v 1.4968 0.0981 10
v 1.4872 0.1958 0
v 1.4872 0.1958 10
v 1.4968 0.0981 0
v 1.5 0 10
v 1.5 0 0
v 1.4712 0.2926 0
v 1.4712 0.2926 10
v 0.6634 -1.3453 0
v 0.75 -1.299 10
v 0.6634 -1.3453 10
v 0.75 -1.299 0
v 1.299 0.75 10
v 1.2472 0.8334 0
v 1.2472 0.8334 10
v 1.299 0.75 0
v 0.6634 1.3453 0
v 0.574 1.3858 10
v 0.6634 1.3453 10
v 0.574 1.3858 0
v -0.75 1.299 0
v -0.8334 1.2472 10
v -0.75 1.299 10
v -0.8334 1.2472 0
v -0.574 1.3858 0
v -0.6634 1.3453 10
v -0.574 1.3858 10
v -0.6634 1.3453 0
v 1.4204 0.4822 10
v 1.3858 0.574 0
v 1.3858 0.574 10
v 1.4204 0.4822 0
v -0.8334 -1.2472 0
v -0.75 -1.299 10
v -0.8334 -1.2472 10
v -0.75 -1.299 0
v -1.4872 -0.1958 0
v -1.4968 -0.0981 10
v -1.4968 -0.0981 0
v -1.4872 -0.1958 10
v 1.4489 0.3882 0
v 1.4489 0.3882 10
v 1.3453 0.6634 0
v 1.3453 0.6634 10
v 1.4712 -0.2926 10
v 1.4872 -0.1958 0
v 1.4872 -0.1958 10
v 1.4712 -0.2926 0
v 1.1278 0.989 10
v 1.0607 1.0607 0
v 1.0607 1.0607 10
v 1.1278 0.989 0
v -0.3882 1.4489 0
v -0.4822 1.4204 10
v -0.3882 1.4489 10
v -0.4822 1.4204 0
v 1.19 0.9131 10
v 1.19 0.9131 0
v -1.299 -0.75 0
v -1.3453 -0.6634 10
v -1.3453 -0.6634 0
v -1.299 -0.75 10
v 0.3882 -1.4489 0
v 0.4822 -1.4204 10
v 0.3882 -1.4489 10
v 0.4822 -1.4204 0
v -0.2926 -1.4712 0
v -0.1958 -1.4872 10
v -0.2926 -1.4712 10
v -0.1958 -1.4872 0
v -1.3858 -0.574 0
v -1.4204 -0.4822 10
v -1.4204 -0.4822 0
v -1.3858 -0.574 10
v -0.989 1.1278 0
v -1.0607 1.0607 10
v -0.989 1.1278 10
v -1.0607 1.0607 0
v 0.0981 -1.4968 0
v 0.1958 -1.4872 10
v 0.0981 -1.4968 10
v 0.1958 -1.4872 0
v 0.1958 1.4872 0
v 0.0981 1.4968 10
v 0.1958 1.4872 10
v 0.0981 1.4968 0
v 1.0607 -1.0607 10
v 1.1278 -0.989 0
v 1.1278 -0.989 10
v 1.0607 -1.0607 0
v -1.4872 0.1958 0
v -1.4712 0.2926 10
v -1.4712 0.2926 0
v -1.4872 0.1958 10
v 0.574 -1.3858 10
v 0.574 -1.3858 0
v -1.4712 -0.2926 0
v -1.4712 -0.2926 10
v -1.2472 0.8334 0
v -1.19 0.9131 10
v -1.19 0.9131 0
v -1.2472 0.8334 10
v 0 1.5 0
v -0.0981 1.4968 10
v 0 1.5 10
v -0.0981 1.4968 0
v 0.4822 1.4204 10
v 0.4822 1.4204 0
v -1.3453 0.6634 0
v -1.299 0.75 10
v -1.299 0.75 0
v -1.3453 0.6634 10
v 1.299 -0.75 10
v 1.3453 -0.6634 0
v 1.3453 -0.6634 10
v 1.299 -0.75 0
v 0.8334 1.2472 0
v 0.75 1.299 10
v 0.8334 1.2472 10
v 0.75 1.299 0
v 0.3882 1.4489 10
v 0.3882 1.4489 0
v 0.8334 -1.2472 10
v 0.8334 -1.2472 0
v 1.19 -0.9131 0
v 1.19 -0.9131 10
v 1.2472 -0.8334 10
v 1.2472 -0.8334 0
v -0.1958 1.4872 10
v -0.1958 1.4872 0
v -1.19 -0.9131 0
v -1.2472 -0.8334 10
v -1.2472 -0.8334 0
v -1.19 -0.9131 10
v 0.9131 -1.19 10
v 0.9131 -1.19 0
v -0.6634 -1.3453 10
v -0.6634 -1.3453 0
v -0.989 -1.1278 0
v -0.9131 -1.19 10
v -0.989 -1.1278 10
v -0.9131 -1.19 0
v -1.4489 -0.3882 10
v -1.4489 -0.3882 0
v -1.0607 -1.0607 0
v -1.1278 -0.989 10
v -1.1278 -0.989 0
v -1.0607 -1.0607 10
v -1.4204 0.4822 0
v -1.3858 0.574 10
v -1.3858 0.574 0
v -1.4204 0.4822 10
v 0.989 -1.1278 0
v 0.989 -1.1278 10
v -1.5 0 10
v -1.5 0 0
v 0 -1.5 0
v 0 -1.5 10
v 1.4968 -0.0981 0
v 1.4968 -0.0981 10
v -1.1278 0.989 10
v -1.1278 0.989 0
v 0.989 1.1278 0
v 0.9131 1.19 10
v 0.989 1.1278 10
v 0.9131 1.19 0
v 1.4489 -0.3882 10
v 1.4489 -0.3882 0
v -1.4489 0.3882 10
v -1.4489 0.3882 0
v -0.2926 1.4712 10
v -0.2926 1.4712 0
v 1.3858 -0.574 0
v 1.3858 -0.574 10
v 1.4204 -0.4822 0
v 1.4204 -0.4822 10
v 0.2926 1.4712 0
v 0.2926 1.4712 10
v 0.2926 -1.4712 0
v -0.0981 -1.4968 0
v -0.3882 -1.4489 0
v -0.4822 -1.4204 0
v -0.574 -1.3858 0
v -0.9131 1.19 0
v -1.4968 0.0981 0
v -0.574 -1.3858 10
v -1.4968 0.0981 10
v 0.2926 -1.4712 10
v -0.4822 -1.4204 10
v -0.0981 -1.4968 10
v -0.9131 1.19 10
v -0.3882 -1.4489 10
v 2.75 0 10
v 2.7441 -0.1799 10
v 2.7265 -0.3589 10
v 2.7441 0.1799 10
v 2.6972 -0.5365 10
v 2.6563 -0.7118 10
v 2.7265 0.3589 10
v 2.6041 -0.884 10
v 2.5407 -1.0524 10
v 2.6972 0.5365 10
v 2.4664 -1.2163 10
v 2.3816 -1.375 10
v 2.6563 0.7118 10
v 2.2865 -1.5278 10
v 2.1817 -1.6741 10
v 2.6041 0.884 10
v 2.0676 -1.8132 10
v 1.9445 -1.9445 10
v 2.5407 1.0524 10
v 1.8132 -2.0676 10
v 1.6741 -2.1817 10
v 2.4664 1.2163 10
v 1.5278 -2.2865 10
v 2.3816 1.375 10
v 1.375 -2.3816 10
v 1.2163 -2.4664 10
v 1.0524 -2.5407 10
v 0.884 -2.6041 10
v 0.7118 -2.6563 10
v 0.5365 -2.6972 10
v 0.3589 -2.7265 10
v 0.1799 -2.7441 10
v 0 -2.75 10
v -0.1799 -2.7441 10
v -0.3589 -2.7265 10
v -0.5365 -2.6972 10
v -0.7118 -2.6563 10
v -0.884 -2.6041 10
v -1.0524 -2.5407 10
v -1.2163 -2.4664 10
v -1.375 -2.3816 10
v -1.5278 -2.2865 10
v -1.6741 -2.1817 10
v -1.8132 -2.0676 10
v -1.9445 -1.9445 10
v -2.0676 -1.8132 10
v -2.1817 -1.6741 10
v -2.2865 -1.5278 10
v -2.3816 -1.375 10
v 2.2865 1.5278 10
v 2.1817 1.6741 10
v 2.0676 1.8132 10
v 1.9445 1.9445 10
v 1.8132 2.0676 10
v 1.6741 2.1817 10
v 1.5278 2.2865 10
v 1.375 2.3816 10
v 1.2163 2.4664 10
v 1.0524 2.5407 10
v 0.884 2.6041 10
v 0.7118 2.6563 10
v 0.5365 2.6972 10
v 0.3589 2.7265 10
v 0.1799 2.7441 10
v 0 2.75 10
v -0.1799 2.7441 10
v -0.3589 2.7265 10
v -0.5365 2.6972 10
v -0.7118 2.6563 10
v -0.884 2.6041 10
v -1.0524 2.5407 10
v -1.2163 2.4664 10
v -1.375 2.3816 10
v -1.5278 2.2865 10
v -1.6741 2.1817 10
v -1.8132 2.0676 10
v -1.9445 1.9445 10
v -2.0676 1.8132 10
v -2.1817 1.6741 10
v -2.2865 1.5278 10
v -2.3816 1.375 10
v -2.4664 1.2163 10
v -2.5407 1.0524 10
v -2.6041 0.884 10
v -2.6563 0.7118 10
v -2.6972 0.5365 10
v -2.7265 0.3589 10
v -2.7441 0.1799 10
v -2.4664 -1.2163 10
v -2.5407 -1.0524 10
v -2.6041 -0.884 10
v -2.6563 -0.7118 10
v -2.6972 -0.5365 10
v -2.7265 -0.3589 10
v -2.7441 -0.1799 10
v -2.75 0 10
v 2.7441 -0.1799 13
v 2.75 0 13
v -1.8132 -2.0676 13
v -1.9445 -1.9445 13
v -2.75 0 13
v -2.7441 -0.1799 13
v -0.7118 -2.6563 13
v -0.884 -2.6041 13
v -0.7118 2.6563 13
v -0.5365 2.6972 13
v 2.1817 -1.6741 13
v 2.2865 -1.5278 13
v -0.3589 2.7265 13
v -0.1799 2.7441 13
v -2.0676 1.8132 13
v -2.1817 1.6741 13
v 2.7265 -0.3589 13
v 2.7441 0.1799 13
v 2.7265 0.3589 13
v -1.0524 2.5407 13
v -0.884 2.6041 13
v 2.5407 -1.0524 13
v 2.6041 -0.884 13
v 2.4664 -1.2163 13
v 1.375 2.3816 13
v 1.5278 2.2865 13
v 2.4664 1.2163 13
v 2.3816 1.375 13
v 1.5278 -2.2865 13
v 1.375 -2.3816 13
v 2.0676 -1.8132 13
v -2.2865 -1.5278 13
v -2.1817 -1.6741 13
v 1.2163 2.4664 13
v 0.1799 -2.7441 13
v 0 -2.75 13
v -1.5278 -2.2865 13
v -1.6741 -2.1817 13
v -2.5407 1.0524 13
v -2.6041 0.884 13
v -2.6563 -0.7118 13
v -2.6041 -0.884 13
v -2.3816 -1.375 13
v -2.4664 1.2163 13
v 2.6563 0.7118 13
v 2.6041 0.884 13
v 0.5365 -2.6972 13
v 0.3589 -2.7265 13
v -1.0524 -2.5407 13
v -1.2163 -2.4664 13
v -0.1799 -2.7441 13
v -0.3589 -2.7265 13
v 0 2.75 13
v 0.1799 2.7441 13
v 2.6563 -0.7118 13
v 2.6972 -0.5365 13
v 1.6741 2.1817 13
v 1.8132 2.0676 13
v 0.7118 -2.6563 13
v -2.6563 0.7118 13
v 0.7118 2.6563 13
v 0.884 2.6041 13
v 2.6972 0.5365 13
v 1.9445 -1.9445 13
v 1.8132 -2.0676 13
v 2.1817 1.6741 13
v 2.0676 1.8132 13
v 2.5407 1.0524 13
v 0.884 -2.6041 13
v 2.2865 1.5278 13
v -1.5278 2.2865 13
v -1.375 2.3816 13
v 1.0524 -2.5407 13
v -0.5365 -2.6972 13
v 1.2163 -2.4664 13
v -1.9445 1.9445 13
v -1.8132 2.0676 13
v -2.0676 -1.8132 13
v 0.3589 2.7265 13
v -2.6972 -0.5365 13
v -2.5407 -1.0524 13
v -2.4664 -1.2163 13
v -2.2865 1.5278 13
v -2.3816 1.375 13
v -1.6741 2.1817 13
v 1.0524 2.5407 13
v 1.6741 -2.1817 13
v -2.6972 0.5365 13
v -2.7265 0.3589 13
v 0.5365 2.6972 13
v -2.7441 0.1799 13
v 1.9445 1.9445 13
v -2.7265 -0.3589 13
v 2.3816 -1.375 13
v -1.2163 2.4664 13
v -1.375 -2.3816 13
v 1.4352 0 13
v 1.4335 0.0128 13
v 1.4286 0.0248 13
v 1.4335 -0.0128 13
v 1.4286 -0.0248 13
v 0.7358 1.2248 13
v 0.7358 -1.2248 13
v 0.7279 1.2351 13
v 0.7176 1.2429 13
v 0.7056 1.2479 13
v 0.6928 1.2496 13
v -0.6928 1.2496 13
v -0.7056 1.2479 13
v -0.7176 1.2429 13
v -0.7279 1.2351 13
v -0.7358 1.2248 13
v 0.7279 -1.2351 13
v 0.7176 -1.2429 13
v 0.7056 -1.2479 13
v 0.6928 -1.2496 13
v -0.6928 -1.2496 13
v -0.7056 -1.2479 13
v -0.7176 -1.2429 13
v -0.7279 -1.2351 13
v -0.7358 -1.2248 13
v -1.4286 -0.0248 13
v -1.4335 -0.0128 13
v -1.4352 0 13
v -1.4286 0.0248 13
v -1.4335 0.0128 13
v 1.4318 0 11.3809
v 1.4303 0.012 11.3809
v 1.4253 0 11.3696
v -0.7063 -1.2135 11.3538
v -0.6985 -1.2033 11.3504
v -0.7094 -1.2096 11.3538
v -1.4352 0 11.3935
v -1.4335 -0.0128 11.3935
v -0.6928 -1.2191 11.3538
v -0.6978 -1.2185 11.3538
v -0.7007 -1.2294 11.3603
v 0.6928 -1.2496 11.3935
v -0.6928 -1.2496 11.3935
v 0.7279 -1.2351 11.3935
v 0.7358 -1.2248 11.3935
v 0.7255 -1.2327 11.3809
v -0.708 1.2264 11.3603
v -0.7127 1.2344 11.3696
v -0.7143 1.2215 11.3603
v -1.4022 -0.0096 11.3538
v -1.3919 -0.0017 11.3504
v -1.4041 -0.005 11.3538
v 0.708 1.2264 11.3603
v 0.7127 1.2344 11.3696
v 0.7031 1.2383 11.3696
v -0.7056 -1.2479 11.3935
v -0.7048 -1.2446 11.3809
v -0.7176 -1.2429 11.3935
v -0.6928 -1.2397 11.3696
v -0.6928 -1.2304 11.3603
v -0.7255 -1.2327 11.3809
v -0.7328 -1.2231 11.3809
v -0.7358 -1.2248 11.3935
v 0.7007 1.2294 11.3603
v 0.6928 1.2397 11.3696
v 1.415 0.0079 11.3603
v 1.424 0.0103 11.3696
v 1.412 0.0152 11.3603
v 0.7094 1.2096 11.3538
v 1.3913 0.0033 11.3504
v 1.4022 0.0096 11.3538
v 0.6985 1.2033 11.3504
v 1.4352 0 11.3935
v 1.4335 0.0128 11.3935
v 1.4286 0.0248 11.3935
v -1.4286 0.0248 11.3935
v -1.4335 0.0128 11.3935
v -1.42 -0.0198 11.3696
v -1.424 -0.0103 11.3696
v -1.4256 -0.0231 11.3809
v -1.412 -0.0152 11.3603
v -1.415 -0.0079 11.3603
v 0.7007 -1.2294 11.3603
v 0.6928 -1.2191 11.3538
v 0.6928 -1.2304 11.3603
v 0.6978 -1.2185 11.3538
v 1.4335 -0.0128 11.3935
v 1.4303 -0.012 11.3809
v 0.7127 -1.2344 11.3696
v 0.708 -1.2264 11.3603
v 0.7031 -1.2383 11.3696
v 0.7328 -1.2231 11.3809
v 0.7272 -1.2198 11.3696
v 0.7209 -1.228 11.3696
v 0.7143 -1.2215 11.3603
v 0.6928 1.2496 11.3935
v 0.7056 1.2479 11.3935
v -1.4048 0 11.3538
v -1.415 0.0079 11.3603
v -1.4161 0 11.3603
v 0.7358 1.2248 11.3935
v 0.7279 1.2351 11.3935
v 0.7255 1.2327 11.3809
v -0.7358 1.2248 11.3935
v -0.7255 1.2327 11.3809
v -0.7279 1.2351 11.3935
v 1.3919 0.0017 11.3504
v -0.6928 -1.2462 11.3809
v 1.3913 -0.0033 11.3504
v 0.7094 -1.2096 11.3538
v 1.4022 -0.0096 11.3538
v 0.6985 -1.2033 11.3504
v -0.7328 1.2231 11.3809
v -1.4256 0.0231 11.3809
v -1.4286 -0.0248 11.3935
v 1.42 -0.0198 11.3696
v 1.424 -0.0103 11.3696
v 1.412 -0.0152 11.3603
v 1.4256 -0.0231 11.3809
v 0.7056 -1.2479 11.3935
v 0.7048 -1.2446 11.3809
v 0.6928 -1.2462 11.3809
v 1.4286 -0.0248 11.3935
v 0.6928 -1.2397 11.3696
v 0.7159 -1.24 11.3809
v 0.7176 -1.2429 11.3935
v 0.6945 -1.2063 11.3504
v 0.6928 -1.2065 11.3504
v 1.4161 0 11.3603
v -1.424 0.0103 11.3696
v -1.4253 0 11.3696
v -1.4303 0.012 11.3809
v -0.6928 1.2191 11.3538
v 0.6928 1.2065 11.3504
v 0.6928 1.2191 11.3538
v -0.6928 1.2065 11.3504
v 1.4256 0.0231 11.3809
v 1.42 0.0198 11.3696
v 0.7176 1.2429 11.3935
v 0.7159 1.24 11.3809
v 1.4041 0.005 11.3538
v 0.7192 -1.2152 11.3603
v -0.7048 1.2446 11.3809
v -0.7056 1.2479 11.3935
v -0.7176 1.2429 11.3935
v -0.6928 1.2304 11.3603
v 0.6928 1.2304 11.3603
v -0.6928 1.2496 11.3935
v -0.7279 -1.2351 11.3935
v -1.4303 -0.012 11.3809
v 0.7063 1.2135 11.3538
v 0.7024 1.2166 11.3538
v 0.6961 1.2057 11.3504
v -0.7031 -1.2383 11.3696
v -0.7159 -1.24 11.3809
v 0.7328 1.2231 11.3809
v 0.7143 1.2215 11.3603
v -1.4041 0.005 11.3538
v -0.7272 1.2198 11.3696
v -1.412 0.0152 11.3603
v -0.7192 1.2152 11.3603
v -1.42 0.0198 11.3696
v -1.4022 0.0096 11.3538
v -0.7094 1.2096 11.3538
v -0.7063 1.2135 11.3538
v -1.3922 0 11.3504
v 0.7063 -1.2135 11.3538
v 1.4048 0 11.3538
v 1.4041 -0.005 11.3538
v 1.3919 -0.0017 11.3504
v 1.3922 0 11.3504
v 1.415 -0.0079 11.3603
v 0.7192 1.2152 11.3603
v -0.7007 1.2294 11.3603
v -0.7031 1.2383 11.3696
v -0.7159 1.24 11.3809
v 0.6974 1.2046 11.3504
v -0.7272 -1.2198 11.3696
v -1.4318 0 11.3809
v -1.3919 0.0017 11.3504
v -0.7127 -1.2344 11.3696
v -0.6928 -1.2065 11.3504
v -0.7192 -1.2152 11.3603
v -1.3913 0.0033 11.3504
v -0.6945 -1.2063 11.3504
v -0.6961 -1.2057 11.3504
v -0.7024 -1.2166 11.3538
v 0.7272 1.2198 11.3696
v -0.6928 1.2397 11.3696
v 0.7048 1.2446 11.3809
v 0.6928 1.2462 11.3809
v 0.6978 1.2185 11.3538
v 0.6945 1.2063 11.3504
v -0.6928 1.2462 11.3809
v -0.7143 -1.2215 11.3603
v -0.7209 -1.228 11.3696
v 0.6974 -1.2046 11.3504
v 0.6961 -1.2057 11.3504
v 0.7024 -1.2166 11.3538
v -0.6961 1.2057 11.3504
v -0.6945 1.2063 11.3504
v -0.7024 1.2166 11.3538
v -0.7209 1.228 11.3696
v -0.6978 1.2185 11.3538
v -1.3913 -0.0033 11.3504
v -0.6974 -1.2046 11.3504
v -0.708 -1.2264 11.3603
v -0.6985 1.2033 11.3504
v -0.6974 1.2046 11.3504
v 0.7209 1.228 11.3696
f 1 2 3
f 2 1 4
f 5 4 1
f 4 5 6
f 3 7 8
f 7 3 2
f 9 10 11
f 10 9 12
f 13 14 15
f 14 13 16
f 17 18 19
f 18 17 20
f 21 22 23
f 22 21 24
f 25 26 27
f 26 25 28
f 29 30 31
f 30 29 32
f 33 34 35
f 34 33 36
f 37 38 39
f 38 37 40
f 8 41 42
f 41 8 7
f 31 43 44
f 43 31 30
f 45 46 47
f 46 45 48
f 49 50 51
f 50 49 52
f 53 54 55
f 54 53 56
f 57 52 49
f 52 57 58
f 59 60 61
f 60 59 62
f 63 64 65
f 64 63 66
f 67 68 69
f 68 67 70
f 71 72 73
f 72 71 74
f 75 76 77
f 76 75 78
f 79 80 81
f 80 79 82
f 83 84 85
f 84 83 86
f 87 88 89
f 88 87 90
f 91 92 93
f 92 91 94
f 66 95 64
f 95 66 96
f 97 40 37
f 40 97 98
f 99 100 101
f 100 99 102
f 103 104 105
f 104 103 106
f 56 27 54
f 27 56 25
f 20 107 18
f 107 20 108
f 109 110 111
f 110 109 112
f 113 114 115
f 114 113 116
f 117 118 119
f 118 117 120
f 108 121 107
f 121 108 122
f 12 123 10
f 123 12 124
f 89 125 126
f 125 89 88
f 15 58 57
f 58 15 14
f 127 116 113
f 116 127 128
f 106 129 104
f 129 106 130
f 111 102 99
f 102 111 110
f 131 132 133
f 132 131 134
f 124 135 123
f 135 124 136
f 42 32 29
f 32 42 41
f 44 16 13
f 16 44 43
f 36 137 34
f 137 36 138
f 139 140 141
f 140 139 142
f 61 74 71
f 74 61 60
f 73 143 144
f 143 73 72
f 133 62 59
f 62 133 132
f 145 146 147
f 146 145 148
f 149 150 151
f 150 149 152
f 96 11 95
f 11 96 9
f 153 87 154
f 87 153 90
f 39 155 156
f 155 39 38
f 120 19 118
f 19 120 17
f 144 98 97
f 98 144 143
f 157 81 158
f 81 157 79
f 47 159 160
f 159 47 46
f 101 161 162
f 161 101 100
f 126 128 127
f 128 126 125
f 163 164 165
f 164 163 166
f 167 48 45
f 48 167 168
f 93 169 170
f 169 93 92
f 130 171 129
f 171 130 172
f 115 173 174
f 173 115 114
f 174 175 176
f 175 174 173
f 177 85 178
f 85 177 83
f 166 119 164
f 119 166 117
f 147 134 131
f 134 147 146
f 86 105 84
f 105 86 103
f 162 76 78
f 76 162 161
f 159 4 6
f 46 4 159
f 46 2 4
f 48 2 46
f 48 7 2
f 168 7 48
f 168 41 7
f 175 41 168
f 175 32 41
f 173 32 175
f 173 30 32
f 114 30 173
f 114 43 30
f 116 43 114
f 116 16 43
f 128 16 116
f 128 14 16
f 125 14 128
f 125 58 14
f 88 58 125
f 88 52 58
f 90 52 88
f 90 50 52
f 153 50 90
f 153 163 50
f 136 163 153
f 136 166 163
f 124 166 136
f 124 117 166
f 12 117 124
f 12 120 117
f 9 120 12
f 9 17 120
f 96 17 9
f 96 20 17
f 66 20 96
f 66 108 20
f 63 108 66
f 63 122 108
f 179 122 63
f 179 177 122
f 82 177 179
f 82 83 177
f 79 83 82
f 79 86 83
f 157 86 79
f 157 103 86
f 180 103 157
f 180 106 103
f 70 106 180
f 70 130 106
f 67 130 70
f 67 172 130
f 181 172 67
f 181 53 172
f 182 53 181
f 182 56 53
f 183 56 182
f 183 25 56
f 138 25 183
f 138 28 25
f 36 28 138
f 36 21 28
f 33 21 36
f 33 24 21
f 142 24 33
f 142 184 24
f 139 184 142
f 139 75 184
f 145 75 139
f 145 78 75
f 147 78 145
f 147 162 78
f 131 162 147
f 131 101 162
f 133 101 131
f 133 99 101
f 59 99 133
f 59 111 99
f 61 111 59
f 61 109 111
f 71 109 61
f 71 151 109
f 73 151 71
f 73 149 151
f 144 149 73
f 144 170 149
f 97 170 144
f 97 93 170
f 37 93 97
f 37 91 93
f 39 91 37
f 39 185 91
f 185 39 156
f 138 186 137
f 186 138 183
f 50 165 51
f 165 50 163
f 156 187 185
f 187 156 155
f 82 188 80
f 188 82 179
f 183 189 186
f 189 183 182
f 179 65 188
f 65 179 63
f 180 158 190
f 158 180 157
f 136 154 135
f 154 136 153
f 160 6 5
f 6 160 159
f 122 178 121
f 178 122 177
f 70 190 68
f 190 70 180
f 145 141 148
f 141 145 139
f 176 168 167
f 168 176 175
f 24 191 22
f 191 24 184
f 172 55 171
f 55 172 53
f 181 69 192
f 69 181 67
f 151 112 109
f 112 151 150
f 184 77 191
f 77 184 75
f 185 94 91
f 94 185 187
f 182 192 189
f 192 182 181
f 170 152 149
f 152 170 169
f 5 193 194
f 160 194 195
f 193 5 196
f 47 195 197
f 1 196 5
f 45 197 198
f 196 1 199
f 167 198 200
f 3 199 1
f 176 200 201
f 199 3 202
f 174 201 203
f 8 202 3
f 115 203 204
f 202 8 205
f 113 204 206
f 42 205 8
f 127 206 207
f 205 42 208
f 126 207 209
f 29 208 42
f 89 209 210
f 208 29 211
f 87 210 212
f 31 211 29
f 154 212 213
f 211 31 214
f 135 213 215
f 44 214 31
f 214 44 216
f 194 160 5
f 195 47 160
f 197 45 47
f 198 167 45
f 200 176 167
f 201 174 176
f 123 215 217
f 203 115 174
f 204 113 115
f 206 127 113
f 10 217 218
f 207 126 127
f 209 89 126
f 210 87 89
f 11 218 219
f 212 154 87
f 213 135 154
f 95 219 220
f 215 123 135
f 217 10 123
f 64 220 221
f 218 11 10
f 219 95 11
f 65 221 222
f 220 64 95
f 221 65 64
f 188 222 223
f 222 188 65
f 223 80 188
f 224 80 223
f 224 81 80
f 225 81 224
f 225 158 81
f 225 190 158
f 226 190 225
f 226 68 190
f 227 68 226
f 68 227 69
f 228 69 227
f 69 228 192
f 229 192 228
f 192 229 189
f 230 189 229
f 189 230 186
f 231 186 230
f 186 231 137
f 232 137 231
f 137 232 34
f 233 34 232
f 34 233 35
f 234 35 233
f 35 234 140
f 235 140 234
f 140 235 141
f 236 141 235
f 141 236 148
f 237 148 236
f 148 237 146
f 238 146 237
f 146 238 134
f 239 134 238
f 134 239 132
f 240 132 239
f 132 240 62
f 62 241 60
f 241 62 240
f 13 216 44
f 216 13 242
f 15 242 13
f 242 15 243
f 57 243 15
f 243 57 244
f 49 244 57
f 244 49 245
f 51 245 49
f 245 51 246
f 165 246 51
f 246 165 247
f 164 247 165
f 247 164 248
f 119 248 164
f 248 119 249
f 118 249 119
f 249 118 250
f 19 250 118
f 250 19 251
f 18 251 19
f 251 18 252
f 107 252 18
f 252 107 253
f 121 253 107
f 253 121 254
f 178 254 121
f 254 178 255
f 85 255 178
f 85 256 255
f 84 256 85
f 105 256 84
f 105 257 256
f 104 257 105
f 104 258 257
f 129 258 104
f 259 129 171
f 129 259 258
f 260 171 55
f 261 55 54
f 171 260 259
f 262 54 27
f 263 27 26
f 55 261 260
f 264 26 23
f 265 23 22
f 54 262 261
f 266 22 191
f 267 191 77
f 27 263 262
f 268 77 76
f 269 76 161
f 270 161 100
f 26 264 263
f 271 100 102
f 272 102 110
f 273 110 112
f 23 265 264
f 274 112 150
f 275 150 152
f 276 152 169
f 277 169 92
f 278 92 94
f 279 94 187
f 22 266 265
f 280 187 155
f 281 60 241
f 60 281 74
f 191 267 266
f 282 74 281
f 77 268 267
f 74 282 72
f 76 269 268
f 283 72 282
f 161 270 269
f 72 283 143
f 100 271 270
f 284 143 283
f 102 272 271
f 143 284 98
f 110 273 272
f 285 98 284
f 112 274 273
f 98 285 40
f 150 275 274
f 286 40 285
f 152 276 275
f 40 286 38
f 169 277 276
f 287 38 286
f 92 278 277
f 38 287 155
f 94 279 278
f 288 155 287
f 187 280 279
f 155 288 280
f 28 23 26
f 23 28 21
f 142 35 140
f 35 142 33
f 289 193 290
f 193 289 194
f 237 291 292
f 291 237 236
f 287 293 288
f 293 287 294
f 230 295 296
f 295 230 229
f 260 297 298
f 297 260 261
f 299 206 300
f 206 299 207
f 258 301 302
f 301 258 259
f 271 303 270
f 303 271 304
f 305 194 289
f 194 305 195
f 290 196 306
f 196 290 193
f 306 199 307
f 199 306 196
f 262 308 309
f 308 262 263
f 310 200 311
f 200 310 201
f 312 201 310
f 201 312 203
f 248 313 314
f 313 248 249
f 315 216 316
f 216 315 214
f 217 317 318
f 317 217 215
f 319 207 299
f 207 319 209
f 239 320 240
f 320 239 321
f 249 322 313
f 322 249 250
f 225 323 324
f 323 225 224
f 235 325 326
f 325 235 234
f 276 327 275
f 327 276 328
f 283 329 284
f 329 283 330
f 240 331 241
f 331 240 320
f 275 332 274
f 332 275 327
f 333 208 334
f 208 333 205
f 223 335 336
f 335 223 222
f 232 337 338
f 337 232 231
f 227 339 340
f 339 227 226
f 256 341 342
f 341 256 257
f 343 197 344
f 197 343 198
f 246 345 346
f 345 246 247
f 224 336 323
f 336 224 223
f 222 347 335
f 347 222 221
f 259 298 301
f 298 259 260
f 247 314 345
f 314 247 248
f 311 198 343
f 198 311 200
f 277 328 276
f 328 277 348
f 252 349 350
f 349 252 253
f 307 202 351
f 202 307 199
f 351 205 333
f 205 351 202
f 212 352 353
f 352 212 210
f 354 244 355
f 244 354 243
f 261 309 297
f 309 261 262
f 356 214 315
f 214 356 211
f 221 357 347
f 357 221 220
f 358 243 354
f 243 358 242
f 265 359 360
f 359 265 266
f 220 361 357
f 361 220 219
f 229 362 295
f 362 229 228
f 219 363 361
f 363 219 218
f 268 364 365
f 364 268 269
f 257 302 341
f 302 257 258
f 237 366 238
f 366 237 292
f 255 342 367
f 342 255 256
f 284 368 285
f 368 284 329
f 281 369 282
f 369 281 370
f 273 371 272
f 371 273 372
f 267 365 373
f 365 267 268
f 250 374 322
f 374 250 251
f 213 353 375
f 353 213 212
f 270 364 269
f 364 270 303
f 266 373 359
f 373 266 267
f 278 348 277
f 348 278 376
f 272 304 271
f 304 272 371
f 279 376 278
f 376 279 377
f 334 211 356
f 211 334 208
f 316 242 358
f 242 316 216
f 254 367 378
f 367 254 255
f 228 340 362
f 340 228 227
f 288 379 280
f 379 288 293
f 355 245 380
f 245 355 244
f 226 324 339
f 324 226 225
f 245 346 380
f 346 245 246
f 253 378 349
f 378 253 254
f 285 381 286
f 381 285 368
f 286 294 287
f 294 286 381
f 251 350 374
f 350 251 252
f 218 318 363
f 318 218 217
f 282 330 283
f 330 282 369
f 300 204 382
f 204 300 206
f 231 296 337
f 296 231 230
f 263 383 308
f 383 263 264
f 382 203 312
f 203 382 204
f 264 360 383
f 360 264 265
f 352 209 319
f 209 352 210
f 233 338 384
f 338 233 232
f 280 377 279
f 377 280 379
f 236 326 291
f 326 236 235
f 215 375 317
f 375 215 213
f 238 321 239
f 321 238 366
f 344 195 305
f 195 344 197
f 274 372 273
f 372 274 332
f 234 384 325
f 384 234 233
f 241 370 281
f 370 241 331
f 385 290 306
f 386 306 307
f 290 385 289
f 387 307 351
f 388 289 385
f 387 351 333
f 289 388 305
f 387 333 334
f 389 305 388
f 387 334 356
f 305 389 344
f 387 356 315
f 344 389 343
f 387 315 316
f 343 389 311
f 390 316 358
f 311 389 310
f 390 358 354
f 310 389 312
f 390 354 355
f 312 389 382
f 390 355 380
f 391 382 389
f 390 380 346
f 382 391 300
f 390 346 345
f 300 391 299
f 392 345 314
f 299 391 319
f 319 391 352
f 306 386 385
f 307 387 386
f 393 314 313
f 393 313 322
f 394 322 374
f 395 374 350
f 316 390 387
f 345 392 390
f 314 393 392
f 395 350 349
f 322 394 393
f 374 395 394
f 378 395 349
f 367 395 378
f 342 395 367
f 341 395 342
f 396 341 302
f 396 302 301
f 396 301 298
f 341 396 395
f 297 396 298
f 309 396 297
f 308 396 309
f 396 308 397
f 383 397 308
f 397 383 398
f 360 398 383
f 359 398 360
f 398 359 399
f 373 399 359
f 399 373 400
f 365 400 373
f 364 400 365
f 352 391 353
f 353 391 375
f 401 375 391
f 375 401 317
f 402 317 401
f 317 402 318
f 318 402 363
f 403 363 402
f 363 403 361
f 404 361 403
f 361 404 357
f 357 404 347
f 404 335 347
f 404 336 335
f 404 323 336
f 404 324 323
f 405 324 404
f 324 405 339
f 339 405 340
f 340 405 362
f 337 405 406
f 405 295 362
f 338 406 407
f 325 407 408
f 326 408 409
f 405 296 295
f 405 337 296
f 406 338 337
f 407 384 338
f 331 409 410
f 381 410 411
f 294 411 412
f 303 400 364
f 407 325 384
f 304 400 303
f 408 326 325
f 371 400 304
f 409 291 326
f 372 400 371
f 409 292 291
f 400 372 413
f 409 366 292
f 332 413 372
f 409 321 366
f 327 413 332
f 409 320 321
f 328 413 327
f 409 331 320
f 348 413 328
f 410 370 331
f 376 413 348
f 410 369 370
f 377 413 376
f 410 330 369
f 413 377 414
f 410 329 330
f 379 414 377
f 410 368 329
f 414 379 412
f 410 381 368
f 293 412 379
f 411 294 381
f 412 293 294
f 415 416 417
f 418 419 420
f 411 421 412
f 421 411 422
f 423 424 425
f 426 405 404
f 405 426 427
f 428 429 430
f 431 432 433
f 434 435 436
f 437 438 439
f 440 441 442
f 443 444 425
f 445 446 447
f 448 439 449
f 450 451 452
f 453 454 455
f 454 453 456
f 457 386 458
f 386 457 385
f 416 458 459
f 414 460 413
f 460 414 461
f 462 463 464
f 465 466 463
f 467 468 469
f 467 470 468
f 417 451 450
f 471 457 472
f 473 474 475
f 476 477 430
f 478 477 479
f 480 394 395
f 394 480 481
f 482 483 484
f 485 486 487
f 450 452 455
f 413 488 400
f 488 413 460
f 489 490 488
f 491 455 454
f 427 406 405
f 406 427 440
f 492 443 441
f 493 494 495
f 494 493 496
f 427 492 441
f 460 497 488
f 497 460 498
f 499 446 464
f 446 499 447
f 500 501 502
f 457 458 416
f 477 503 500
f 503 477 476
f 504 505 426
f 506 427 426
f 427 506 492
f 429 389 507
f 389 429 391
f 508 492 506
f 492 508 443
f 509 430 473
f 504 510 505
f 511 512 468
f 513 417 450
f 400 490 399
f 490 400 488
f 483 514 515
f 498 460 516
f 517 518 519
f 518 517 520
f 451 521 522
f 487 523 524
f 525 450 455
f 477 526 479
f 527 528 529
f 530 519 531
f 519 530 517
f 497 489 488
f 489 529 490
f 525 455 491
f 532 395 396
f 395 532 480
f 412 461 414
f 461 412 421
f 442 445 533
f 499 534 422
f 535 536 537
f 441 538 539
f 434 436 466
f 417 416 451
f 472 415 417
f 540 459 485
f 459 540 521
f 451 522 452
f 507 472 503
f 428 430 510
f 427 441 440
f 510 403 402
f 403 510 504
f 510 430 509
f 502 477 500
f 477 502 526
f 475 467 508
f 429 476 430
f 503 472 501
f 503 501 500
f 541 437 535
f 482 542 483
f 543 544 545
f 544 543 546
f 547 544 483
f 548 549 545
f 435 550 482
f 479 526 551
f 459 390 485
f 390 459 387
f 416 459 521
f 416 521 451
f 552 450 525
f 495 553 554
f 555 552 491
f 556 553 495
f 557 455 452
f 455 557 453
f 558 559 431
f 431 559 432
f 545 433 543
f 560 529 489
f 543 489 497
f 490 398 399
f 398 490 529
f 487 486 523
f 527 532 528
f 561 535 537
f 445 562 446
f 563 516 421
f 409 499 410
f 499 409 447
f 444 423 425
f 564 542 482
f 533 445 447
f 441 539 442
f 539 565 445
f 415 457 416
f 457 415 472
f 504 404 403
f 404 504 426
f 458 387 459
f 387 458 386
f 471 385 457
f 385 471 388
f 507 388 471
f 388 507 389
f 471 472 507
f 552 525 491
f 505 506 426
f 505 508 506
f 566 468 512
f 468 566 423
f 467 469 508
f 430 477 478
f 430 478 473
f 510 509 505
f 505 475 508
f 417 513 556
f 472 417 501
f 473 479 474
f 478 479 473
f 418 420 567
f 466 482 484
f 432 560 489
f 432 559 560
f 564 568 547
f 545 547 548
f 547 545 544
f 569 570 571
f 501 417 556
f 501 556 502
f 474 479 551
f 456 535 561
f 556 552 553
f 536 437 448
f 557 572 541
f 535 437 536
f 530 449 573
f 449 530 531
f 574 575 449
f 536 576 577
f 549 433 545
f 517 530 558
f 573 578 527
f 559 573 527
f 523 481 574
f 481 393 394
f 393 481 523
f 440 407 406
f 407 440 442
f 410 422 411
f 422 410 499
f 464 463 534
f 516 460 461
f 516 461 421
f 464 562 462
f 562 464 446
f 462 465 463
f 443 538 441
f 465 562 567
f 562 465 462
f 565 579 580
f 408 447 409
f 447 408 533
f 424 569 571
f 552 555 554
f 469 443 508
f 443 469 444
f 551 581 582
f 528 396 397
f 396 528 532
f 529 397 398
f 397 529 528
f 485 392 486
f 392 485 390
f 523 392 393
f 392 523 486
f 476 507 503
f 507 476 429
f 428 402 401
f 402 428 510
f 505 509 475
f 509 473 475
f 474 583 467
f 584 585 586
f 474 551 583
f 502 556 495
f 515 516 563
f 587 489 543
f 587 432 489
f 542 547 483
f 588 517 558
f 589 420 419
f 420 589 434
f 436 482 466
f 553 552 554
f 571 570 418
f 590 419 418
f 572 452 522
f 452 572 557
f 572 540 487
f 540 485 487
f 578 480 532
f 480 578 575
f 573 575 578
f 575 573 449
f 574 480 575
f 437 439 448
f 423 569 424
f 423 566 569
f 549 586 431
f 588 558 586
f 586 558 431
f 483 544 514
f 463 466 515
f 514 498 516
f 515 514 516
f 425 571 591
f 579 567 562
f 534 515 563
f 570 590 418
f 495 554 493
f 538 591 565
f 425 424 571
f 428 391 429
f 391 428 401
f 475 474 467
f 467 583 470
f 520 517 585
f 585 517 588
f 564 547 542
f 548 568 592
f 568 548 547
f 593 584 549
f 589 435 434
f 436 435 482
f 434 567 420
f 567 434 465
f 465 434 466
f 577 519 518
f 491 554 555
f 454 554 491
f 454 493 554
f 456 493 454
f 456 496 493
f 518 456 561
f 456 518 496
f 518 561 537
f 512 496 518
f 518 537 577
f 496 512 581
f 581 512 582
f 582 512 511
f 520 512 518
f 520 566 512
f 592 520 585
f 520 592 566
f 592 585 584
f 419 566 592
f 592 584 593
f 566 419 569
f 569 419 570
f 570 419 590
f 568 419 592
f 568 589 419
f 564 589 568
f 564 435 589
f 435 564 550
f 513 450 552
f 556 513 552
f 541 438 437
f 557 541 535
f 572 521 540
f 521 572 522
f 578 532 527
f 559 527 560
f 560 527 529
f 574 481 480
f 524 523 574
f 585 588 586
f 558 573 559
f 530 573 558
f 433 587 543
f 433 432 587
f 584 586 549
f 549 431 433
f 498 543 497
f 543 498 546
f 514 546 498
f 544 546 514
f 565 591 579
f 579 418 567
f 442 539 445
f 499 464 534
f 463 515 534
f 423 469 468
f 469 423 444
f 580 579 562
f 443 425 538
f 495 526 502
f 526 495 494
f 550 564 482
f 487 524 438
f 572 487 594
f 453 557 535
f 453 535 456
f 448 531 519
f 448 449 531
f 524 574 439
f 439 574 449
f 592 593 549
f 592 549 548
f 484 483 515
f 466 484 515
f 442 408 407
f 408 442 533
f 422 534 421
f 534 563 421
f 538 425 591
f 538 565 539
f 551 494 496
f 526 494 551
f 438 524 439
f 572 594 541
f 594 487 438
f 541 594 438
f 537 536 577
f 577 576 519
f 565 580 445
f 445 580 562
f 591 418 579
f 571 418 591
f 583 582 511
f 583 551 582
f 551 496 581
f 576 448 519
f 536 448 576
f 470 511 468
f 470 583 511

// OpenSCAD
$fn=96;

d_shaft = 3.0;
L = 10.0;

d_head = 5.5;
h_head = 3.0;

// Approximate hex socket for M3 socket head cap screw
socket_af = 2.5;          // across flats
socket_depth = 1.6;       // depth
socket_corner_r = 0.05;   // tiny rounding to avoid degeneracy

module hex_prism_af(af, h){
    // Regular hex with given across-flats dimension
    r = af / sqrt(3); // circumradius
    cylinder(h=h, r=r, $fn=6);
}

module socket_head_cap_screw(){
    difference(){
        union(){
            // Shaft (unthreaded approximation)
            cylinder(h=L, d=d_shaft);

            // Head
            translate([0,0,L])
                cylinder(h=h_head, d=d_head);
        }

        // Hex socket cut
        translate([0,0,L + h_head - socket_depth])
            minkowski(){
                hex_prism_af(socket_af - 2*socket_corner_r, socket_depth);
                sphere(r=socket_corner_r, $fn=24);
            }
    }
}

socket_head_cap_screw();
